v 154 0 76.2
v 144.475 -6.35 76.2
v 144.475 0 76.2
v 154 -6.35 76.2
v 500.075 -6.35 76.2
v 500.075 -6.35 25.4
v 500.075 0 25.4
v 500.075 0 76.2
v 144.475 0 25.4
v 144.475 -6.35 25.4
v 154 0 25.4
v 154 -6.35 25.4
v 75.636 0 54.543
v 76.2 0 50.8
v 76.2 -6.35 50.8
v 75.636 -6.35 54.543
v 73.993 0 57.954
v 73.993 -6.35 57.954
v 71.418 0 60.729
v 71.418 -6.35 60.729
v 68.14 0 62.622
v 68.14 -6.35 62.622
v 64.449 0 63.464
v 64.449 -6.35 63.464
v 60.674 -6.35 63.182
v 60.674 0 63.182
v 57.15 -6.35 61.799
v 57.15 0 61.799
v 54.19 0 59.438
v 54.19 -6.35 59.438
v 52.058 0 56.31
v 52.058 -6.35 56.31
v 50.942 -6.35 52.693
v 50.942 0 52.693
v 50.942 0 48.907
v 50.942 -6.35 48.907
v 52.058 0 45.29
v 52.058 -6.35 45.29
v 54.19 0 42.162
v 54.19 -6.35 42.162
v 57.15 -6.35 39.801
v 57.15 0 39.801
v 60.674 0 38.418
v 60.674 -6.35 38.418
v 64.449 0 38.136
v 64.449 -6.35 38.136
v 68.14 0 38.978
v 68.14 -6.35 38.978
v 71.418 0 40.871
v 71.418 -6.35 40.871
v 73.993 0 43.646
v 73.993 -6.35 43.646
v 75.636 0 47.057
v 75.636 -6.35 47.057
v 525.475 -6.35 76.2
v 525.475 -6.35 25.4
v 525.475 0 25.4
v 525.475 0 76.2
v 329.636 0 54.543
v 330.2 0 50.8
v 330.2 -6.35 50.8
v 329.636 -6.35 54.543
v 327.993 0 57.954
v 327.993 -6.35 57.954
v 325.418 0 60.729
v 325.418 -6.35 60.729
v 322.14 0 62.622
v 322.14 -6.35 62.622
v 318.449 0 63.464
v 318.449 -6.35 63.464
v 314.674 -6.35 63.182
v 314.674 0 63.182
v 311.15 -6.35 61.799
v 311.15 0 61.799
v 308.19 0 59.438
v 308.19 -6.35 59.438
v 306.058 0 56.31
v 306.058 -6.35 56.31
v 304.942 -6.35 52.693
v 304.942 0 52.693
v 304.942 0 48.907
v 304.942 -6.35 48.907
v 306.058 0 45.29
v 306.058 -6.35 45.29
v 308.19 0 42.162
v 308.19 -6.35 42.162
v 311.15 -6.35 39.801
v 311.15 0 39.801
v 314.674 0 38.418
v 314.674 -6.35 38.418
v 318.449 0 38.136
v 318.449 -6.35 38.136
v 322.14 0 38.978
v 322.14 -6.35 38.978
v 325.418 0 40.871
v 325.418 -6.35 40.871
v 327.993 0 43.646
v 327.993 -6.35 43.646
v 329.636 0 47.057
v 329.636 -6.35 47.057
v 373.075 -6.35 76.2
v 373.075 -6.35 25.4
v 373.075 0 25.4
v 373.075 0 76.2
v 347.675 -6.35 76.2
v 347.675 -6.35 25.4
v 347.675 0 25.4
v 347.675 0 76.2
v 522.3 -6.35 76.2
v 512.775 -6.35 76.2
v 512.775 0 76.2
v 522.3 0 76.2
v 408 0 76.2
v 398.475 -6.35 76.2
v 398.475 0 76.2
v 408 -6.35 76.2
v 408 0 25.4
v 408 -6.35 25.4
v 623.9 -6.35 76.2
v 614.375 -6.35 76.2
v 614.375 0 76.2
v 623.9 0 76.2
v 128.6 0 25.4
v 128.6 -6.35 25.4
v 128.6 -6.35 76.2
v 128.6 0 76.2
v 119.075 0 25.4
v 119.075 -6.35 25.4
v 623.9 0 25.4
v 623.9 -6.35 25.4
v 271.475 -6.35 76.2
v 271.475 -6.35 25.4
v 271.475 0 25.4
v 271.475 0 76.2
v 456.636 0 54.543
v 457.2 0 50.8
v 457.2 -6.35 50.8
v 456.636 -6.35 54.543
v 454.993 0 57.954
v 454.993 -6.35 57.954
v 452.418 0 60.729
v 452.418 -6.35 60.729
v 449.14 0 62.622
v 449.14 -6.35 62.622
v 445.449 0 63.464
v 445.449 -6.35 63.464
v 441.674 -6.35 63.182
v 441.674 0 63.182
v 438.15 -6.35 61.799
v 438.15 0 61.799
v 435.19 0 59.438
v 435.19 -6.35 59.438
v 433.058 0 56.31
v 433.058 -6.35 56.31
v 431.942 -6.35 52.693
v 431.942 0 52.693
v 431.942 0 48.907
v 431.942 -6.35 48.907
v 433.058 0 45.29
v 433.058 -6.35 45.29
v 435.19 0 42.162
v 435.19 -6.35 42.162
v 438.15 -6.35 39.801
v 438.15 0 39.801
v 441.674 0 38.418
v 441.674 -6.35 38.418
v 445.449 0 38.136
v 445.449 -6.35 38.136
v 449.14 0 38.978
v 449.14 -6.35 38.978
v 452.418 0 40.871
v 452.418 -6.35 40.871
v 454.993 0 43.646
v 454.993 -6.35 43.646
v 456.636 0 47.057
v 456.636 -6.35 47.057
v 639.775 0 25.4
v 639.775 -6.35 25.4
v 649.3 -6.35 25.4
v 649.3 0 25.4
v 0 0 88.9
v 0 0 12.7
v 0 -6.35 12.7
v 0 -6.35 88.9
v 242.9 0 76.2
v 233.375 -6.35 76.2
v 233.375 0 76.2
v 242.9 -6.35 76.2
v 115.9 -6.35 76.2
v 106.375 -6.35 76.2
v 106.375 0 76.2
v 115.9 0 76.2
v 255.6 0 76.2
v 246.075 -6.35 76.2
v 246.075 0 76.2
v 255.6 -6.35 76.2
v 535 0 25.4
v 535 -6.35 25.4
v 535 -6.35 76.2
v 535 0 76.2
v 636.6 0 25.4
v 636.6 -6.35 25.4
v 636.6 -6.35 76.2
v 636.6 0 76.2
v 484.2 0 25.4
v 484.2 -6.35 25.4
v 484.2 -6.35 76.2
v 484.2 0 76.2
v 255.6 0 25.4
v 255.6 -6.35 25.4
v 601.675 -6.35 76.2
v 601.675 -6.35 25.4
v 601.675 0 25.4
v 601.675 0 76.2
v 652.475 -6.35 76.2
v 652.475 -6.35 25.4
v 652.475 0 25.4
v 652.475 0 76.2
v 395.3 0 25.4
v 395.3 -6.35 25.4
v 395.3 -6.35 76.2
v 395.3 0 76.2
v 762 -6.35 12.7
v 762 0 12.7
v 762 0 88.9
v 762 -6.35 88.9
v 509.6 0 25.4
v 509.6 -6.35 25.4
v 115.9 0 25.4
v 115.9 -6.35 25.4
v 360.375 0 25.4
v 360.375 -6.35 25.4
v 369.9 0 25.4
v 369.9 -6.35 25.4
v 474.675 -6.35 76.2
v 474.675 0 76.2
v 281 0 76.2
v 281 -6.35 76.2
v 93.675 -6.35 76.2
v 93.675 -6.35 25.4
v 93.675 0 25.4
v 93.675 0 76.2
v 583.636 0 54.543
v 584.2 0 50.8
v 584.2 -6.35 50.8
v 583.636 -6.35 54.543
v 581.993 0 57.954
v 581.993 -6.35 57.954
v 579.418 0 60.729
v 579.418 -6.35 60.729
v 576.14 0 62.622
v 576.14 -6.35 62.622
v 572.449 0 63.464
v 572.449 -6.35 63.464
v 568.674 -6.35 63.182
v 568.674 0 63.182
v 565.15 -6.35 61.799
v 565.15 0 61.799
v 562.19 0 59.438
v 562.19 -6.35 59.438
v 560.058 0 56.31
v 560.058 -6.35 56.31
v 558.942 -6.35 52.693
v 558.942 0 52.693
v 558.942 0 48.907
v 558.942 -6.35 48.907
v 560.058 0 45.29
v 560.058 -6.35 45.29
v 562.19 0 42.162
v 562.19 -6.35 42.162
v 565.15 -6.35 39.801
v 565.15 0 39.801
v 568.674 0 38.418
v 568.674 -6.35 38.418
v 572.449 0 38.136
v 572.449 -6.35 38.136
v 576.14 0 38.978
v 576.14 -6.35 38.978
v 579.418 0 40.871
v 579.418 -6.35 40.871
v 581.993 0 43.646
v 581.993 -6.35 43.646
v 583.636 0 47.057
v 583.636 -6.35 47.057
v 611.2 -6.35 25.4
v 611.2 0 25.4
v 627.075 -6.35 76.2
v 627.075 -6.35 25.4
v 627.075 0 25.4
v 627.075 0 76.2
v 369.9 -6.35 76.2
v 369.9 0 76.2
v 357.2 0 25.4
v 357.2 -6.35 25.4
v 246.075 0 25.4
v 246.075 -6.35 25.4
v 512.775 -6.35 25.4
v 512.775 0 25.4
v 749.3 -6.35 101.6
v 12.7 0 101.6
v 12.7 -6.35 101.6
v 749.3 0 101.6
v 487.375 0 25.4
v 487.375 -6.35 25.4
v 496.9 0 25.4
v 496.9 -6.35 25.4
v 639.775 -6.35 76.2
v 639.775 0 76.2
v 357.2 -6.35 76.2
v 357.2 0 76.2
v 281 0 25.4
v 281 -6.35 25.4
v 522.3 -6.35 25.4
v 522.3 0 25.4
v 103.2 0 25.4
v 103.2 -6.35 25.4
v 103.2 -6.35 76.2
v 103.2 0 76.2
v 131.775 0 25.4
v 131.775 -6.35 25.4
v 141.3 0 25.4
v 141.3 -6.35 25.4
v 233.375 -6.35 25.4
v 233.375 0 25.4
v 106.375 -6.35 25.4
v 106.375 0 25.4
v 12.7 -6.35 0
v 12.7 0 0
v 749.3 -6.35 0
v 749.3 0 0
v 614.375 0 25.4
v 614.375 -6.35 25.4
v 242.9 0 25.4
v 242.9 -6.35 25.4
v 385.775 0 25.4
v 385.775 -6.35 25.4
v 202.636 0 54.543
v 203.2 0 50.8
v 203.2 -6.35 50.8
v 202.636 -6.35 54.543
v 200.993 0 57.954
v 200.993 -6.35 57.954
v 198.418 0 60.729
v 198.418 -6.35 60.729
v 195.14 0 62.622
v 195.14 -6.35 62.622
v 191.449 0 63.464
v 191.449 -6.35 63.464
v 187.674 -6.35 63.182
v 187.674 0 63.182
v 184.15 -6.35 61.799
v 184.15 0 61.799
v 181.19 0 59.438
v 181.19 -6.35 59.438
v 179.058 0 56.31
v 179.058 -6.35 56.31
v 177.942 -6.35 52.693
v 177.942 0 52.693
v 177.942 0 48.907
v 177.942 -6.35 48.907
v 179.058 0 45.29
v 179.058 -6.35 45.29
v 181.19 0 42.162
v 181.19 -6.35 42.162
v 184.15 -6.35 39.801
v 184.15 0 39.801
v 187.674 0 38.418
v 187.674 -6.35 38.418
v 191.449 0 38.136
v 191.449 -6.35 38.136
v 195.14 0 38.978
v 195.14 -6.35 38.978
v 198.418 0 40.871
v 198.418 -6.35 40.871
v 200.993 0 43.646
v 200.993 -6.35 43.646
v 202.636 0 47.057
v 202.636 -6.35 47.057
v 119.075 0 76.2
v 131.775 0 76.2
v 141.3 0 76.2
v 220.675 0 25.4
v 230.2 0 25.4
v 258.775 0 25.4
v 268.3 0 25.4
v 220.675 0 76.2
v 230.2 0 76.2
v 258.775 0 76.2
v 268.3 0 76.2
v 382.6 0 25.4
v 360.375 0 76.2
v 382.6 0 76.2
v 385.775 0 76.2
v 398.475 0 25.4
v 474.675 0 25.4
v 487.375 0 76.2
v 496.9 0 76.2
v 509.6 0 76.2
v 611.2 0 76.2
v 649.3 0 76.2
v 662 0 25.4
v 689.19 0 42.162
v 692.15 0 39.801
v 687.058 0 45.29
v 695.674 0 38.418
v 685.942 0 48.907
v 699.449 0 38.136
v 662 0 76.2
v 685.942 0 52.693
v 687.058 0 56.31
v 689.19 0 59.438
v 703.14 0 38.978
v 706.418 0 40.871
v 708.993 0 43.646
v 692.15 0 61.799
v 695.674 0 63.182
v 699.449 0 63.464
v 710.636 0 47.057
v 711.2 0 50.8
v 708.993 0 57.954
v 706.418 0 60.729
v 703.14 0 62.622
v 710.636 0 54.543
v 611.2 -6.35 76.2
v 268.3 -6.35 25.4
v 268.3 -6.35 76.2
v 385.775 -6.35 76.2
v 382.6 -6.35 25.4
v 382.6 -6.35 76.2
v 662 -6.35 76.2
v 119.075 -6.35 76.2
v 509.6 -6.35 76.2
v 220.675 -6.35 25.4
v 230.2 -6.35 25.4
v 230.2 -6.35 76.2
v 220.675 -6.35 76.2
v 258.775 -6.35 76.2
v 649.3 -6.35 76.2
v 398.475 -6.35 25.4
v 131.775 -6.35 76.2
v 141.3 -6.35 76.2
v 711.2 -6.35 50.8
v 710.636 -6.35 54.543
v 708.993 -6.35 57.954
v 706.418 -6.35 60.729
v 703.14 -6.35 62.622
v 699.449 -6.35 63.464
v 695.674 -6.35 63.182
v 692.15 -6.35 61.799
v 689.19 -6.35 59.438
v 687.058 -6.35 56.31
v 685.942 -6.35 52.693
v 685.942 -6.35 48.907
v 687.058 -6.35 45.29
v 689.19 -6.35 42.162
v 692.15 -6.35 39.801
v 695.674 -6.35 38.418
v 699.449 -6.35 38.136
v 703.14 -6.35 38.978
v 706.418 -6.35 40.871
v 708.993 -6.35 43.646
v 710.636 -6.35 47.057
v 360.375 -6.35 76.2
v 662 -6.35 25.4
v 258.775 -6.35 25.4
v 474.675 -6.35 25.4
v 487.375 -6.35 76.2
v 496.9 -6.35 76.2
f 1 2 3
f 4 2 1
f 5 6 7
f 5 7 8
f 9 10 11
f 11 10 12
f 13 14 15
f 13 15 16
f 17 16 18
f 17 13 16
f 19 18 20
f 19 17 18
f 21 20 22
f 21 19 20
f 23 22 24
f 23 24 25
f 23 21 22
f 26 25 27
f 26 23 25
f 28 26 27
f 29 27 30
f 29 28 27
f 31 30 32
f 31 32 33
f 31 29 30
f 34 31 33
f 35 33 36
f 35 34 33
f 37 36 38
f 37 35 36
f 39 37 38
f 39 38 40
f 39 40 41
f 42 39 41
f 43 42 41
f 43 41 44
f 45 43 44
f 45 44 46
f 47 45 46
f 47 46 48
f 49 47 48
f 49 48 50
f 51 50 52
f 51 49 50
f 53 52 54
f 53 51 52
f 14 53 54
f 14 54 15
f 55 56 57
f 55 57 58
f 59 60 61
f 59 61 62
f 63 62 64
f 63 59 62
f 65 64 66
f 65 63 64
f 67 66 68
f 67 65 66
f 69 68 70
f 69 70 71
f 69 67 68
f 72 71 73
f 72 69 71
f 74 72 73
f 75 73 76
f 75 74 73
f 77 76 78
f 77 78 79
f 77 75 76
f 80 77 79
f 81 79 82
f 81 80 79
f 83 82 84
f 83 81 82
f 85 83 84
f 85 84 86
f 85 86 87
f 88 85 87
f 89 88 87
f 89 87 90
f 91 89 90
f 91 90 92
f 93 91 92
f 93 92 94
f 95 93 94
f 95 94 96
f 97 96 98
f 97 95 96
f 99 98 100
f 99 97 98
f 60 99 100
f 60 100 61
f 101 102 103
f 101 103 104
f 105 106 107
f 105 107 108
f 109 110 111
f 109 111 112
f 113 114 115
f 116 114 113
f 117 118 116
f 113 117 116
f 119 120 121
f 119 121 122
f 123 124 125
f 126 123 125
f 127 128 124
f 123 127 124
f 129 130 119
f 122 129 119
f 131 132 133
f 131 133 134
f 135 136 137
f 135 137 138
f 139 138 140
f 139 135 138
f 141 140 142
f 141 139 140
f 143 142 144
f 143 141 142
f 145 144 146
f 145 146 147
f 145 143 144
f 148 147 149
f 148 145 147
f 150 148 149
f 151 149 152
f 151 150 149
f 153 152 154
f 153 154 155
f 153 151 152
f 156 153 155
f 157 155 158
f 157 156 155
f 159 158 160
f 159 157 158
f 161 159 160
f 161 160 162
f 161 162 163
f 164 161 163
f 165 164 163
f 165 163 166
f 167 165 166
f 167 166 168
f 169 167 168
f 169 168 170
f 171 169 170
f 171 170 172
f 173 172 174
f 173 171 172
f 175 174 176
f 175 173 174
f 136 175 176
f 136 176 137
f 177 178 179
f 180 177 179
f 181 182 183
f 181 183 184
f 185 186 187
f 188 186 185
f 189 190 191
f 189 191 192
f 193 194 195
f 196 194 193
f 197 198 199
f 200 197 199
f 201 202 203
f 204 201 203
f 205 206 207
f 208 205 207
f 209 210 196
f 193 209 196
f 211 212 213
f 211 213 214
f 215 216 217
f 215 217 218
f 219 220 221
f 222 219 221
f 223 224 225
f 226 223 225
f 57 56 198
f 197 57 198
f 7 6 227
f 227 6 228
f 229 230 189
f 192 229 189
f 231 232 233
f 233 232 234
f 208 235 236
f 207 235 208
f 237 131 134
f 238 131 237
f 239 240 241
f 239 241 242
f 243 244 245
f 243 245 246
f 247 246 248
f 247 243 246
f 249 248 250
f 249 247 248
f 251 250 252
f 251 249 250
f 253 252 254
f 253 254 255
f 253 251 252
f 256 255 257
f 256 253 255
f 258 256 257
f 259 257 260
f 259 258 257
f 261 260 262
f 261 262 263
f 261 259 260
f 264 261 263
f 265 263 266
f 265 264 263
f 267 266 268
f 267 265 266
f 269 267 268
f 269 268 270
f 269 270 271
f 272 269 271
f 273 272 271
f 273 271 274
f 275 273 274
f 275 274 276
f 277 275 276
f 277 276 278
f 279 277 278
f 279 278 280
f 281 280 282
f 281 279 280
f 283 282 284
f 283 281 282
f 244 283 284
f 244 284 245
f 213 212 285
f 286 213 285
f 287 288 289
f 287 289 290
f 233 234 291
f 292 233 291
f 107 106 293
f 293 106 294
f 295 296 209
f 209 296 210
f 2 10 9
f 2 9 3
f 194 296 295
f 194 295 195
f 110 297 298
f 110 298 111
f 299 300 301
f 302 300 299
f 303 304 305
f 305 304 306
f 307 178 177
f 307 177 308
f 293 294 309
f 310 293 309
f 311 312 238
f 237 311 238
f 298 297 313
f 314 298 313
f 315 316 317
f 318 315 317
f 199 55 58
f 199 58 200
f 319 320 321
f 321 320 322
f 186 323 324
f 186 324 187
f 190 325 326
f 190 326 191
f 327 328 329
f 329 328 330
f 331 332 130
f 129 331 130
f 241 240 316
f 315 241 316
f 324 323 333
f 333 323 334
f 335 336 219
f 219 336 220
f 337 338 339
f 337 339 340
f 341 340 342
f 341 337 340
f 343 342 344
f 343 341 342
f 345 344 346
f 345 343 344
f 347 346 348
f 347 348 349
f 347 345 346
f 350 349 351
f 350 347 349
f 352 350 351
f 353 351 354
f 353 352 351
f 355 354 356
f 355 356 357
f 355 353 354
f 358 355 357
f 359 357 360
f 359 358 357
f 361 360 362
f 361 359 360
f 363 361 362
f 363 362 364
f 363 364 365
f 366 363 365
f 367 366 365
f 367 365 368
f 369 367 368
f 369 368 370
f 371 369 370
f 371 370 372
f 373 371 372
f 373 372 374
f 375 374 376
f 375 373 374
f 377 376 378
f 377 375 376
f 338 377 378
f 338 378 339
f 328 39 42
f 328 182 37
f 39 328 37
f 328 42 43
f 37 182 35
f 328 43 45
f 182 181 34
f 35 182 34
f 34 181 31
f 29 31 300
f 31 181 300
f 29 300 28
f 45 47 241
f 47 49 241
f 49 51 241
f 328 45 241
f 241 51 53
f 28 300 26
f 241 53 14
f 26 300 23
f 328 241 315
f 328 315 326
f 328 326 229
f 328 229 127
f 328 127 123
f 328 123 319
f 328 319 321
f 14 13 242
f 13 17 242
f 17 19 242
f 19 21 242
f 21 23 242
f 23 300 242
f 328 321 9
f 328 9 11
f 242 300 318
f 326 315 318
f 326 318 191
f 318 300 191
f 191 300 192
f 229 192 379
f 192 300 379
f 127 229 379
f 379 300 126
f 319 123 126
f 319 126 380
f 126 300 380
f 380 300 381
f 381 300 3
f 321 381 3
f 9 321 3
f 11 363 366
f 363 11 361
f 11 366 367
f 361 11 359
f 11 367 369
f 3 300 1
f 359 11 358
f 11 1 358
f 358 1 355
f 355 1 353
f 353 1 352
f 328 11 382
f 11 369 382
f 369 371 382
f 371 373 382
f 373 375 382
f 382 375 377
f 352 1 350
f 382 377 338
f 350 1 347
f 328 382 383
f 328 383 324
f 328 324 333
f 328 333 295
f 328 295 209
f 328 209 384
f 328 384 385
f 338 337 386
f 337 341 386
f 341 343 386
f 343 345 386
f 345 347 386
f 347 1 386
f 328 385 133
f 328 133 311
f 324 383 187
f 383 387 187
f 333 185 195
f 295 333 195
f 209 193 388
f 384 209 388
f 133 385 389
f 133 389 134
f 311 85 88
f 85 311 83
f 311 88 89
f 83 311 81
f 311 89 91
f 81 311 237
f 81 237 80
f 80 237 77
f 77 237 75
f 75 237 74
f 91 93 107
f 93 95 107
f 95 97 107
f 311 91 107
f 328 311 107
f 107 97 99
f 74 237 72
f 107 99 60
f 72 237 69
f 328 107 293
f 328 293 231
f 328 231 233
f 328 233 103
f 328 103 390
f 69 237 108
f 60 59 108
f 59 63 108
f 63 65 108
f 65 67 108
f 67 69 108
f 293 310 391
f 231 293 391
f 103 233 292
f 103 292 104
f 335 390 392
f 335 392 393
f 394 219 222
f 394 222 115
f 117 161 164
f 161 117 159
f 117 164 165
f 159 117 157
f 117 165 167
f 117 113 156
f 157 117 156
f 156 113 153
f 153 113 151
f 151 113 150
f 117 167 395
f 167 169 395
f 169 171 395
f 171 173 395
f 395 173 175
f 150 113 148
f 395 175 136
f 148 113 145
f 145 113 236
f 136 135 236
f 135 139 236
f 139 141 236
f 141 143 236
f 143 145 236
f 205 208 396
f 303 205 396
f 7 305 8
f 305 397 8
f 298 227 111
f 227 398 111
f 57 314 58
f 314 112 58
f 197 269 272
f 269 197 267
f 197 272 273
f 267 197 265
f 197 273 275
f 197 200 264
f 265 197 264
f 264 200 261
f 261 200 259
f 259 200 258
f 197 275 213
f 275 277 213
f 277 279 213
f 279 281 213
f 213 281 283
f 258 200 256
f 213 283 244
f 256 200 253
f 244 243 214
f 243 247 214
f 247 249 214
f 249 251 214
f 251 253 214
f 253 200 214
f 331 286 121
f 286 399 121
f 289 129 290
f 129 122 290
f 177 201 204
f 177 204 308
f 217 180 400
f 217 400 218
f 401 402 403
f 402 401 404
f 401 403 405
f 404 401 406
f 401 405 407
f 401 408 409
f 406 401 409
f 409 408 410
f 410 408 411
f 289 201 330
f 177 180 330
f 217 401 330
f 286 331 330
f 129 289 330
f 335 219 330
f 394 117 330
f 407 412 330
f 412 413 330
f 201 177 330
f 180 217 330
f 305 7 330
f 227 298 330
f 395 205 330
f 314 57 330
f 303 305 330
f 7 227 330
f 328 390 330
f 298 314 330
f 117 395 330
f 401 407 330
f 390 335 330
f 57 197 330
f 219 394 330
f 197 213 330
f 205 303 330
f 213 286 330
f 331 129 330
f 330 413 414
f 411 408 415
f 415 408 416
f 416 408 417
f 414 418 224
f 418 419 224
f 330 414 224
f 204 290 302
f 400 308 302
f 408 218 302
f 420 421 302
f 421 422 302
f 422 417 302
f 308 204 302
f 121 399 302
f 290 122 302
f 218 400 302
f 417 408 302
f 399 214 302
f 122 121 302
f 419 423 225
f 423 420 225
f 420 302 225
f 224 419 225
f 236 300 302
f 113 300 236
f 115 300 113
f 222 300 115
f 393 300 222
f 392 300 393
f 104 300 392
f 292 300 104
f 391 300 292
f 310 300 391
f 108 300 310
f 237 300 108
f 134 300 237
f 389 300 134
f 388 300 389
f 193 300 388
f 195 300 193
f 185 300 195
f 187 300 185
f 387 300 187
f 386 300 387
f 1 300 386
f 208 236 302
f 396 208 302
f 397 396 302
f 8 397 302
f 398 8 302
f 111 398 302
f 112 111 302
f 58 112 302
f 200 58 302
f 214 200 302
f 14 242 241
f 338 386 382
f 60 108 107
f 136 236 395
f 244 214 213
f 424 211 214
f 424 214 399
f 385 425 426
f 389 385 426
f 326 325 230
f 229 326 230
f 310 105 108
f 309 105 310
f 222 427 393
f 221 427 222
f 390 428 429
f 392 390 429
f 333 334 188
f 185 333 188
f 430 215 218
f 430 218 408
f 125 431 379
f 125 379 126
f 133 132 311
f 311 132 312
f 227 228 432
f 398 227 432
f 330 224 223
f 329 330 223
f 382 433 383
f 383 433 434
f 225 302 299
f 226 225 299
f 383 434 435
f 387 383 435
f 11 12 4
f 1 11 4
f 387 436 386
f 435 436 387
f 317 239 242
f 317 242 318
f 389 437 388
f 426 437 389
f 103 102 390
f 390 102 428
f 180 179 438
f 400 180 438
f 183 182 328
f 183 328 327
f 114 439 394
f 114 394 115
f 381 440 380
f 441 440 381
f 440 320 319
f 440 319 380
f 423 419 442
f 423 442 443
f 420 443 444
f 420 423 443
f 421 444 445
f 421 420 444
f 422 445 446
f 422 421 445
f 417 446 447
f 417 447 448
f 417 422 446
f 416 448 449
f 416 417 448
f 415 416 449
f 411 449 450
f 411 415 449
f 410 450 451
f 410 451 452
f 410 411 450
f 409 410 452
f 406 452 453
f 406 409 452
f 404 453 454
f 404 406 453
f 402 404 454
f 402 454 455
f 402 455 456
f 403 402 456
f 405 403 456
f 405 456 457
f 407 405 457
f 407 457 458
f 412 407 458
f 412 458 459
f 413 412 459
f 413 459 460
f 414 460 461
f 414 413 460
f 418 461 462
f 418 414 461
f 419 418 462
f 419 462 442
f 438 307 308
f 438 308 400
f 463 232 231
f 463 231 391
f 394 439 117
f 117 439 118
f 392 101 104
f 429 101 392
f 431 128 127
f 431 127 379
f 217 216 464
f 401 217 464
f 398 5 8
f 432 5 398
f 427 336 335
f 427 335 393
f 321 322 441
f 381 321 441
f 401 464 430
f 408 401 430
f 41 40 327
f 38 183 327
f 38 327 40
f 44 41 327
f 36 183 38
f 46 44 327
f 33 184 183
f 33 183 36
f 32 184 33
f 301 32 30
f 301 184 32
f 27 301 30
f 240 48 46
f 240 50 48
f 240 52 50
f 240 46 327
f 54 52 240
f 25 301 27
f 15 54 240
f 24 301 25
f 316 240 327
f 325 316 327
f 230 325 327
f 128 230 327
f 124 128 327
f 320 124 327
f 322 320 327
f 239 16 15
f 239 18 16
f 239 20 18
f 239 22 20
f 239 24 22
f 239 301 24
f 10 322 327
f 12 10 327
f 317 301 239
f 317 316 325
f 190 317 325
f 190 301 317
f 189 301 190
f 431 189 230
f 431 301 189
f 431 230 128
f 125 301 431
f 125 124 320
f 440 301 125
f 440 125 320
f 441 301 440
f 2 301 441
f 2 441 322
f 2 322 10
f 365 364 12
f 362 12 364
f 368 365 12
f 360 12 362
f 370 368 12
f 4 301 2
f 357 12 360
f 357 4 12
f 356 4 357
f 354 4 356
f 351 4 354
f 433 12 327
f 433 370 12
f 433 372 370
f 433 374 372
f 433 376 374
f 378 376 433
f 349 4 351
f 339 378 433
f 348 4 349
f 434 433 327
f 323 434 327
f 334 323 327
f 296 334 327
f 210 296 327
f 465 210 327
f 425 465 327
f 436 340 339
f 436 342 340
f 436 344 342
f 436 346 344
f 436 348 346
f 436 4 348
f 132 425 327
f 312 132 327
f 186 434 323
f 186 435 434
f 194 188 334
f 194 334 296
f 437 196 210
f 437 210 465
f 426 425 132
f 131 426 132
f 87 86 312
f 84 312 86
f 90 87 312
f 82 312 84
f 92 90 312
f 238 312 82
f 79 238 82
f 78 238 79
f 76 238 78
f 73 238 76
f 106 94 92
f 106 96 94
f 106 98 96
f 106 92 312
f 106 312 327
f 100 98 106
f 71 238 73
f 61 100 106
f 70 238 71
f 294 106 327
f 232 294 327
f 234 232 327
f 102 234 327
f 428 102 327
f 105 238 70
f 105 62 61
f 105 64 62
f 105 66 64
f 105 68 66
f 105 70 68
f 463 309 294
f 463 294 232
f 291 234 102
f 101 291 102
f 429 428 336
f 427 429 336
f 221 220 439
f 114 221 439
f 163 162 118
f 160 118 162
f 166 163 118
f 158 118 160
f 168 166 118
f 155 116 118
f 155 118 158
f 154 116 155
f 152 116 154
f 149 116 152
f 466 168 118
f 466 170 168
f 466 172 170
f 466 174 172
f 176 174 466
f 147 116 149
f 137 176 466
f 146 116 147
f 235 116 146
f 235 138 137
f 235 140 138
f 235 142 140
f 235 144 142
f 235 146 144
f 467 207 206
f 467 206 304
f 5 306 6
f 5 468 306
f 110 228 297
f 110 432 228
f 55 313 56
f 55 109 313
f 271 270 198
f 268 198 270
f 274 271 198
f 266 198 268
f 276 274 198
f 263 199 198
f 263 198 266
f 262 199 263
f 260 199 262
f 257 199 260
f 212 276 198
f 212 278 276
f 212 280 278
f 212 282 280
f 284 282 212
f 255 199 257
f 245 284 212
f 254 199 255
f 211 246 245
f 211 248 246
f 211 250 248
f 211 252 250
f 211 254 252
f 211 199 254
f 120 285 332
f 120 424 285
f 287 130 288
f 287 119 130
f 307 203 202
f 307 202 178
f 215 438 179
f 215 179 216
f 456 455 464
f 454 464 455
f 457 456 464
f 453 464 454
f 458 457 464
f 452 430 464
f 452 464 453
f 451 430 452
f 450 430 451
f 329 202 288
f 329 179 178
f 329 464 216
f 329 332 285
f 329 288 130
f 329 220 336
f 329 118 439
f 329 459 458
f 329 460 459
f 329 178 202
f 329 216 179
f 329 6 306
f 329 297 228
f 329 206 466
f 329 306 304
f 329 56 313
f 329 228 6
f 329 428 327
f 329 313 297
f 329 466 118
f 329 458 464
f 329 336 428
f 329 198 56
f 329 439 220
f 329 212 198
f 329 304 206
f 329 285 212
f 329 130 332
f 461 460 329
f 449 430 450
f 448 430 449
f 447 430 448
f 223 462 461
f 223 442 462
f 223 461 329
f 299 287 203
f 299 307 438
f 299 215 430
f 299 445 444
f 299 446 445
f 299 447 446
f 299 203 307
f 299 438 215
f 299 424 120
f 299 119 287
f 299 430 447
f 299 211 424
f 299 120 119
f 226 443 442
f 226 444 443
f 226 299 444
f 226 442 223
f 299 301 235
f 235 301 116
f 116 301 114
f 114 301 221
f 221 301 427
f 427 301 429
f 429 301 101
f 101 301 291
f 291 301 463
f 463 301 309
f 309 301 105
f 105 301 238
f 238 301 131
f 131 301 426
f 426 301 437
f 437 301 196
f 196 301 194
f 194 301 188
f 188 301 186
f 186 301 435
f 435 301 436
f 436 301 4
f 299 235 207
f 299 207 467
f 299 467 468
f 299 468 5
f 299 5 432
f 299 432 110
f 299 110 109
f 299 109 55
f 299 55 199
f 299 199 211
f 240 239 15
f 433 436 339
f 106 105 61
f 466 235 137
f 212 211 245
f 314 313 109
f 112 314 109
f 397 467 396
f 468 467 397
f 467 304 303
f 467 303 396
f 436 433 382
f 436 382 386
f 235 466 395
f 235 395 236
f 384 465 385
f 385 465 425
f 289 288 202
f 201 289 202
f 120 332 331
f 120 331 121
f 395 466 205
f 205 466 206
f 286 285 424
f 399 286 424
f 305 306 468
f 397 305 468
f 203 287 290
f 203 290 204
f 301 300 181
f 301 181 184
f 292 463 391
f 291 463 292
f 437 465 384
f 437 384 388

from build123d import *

# Parameters (mm, degrees)
F0_W     = 762
F0_H     = 101.6
F0_R     = 12.7
F1_DEPTH = 6.35
F2_SIZE  = 12.7
F3_W     = 9.525
F3_H     = 50.8
F4_DEPTH = 6.351


with BuildPart() as f1:
    # F0 (on Front) → F1 (new body)
    with BuildSketch(Plane.XZ):
        with Locations((381, 50.8)):
            Rectangle(F0_W, F0_H)
        with Locations((63.5, 50.8)):
            Circle(F0_R, mode=Mode.SUBTRACT)
        with Locations((190.5, 50.8)):
            Circle(F0_R, mode=Mode.SUBTRACT)
        with Locations((317.5, 50.8)):
            Circle(F0_R, mode=Mode.SUBTRACT)
        with Locations((444.5, 50.8)):
            Circle(F0_R, mode=Mode.SUBTRACT)
        with Locations((571.5, 50.8)):
            Circle(F0_R, mode=Mode.SUBTRACT)
        with Locations((698.5, 50.8)):
            Circle(F0_R, mode=Mode.SUBTRACT)
    extrude(amount=F1_DEPTH)

    # F2
    f2_edges = [f1.edges().sort_by_distance(p)[0] for p in [
        (0, -3.175, 101.6),
        (0, -3.175, 0),
        (762, -3.175, 0),
        (762, -3.175, 101.6),
    ]]
    chamfer(f2_edges, length=F2_SIZE)

    # F3 (on face) → F4 (cut, through all)
    with BuildSketch(Plane.XZ.offset(6.35)):
        with Locations((98.4377, 50.8)):
            Rectangle(F3_W, F3_H)
        with Locations((111.1377, 50.8)):
            Rectangle(F3_W, F3_H)
        with Locations((123.8377, 50.8)):
            Rectangle(F3_W, F3_H)
        with Locations((136.5377, 50.8)):
            Rectangle(F3_W, F3_H)
        with Locations((149.2377, 50.8)):
            Rectangle(F3_W, F3_H)
        with Locations((225.4377, 50.8)):
            Rectangle(F3_W, F3_H)
        with Locations((238.1377, 50.8)):
            Rectangle(F3_W, F3_H)
        with Locations((250.8377, 50.8)):
            Rectangle(F3_W, F3_H)
        with Locations((263.5377, 50.8)):
            Rectangle(F3_W, F3_H)
        with Locations((276.2377, 50.8)):
            Rectangle(F3_W, F3_H)
        with Locations((352.4377, 50.8)):
            Rectangle(F3_W, F3_H)
        with Locations((365.1377, 50.8)):
            Rectangle(F3_W, F3_H)
        with Locations((377.8377, 50.8)):
            Rectangle(F3_W, F3_H)
        with Locations((390.5377, 50.8)):
            Rectangle(F3_W, F3_H)
        with Locations((403.2377, 50.8)):
            Rectangle(F3_W, F3_H)
        with Locations((479.4377, 50.8)):
            Rectangle(F3_W, F3_H)
        with Locations((492.1377, 50.8)):
            Rectangle(F3_W, F3_H)
        with Locations((504.8377, 50.8)):
            Rectangle(F3_W, F3_H)
        with Locations((517.5377, 50.8)):
            Rectangle(F3_W, F3_H)
        with Locations((530.2377, 50.8)):
            Rectangle(F3_W, F3_H)
        with Locations((606.4377, 50.8)):
            Rectangle(F3_W, F3_H)
        with Locations((619.1377, 50.8)):
            Rectangle(F3_W, F3_H)
        with Locations((631.8377, 50.8)):
            Rectangle(F3_W, F3_H)
        with Locations((644.5377, 50.8)):
            Rectangle(F3_W, F3_H)
        with Locations((657.2377, 50.8)):
            Rectangle(F3_W, F3_H)
    extrude(amount=-F4_DEPTH, mode=Mode.SUBTRACT)


solid = f1.part
